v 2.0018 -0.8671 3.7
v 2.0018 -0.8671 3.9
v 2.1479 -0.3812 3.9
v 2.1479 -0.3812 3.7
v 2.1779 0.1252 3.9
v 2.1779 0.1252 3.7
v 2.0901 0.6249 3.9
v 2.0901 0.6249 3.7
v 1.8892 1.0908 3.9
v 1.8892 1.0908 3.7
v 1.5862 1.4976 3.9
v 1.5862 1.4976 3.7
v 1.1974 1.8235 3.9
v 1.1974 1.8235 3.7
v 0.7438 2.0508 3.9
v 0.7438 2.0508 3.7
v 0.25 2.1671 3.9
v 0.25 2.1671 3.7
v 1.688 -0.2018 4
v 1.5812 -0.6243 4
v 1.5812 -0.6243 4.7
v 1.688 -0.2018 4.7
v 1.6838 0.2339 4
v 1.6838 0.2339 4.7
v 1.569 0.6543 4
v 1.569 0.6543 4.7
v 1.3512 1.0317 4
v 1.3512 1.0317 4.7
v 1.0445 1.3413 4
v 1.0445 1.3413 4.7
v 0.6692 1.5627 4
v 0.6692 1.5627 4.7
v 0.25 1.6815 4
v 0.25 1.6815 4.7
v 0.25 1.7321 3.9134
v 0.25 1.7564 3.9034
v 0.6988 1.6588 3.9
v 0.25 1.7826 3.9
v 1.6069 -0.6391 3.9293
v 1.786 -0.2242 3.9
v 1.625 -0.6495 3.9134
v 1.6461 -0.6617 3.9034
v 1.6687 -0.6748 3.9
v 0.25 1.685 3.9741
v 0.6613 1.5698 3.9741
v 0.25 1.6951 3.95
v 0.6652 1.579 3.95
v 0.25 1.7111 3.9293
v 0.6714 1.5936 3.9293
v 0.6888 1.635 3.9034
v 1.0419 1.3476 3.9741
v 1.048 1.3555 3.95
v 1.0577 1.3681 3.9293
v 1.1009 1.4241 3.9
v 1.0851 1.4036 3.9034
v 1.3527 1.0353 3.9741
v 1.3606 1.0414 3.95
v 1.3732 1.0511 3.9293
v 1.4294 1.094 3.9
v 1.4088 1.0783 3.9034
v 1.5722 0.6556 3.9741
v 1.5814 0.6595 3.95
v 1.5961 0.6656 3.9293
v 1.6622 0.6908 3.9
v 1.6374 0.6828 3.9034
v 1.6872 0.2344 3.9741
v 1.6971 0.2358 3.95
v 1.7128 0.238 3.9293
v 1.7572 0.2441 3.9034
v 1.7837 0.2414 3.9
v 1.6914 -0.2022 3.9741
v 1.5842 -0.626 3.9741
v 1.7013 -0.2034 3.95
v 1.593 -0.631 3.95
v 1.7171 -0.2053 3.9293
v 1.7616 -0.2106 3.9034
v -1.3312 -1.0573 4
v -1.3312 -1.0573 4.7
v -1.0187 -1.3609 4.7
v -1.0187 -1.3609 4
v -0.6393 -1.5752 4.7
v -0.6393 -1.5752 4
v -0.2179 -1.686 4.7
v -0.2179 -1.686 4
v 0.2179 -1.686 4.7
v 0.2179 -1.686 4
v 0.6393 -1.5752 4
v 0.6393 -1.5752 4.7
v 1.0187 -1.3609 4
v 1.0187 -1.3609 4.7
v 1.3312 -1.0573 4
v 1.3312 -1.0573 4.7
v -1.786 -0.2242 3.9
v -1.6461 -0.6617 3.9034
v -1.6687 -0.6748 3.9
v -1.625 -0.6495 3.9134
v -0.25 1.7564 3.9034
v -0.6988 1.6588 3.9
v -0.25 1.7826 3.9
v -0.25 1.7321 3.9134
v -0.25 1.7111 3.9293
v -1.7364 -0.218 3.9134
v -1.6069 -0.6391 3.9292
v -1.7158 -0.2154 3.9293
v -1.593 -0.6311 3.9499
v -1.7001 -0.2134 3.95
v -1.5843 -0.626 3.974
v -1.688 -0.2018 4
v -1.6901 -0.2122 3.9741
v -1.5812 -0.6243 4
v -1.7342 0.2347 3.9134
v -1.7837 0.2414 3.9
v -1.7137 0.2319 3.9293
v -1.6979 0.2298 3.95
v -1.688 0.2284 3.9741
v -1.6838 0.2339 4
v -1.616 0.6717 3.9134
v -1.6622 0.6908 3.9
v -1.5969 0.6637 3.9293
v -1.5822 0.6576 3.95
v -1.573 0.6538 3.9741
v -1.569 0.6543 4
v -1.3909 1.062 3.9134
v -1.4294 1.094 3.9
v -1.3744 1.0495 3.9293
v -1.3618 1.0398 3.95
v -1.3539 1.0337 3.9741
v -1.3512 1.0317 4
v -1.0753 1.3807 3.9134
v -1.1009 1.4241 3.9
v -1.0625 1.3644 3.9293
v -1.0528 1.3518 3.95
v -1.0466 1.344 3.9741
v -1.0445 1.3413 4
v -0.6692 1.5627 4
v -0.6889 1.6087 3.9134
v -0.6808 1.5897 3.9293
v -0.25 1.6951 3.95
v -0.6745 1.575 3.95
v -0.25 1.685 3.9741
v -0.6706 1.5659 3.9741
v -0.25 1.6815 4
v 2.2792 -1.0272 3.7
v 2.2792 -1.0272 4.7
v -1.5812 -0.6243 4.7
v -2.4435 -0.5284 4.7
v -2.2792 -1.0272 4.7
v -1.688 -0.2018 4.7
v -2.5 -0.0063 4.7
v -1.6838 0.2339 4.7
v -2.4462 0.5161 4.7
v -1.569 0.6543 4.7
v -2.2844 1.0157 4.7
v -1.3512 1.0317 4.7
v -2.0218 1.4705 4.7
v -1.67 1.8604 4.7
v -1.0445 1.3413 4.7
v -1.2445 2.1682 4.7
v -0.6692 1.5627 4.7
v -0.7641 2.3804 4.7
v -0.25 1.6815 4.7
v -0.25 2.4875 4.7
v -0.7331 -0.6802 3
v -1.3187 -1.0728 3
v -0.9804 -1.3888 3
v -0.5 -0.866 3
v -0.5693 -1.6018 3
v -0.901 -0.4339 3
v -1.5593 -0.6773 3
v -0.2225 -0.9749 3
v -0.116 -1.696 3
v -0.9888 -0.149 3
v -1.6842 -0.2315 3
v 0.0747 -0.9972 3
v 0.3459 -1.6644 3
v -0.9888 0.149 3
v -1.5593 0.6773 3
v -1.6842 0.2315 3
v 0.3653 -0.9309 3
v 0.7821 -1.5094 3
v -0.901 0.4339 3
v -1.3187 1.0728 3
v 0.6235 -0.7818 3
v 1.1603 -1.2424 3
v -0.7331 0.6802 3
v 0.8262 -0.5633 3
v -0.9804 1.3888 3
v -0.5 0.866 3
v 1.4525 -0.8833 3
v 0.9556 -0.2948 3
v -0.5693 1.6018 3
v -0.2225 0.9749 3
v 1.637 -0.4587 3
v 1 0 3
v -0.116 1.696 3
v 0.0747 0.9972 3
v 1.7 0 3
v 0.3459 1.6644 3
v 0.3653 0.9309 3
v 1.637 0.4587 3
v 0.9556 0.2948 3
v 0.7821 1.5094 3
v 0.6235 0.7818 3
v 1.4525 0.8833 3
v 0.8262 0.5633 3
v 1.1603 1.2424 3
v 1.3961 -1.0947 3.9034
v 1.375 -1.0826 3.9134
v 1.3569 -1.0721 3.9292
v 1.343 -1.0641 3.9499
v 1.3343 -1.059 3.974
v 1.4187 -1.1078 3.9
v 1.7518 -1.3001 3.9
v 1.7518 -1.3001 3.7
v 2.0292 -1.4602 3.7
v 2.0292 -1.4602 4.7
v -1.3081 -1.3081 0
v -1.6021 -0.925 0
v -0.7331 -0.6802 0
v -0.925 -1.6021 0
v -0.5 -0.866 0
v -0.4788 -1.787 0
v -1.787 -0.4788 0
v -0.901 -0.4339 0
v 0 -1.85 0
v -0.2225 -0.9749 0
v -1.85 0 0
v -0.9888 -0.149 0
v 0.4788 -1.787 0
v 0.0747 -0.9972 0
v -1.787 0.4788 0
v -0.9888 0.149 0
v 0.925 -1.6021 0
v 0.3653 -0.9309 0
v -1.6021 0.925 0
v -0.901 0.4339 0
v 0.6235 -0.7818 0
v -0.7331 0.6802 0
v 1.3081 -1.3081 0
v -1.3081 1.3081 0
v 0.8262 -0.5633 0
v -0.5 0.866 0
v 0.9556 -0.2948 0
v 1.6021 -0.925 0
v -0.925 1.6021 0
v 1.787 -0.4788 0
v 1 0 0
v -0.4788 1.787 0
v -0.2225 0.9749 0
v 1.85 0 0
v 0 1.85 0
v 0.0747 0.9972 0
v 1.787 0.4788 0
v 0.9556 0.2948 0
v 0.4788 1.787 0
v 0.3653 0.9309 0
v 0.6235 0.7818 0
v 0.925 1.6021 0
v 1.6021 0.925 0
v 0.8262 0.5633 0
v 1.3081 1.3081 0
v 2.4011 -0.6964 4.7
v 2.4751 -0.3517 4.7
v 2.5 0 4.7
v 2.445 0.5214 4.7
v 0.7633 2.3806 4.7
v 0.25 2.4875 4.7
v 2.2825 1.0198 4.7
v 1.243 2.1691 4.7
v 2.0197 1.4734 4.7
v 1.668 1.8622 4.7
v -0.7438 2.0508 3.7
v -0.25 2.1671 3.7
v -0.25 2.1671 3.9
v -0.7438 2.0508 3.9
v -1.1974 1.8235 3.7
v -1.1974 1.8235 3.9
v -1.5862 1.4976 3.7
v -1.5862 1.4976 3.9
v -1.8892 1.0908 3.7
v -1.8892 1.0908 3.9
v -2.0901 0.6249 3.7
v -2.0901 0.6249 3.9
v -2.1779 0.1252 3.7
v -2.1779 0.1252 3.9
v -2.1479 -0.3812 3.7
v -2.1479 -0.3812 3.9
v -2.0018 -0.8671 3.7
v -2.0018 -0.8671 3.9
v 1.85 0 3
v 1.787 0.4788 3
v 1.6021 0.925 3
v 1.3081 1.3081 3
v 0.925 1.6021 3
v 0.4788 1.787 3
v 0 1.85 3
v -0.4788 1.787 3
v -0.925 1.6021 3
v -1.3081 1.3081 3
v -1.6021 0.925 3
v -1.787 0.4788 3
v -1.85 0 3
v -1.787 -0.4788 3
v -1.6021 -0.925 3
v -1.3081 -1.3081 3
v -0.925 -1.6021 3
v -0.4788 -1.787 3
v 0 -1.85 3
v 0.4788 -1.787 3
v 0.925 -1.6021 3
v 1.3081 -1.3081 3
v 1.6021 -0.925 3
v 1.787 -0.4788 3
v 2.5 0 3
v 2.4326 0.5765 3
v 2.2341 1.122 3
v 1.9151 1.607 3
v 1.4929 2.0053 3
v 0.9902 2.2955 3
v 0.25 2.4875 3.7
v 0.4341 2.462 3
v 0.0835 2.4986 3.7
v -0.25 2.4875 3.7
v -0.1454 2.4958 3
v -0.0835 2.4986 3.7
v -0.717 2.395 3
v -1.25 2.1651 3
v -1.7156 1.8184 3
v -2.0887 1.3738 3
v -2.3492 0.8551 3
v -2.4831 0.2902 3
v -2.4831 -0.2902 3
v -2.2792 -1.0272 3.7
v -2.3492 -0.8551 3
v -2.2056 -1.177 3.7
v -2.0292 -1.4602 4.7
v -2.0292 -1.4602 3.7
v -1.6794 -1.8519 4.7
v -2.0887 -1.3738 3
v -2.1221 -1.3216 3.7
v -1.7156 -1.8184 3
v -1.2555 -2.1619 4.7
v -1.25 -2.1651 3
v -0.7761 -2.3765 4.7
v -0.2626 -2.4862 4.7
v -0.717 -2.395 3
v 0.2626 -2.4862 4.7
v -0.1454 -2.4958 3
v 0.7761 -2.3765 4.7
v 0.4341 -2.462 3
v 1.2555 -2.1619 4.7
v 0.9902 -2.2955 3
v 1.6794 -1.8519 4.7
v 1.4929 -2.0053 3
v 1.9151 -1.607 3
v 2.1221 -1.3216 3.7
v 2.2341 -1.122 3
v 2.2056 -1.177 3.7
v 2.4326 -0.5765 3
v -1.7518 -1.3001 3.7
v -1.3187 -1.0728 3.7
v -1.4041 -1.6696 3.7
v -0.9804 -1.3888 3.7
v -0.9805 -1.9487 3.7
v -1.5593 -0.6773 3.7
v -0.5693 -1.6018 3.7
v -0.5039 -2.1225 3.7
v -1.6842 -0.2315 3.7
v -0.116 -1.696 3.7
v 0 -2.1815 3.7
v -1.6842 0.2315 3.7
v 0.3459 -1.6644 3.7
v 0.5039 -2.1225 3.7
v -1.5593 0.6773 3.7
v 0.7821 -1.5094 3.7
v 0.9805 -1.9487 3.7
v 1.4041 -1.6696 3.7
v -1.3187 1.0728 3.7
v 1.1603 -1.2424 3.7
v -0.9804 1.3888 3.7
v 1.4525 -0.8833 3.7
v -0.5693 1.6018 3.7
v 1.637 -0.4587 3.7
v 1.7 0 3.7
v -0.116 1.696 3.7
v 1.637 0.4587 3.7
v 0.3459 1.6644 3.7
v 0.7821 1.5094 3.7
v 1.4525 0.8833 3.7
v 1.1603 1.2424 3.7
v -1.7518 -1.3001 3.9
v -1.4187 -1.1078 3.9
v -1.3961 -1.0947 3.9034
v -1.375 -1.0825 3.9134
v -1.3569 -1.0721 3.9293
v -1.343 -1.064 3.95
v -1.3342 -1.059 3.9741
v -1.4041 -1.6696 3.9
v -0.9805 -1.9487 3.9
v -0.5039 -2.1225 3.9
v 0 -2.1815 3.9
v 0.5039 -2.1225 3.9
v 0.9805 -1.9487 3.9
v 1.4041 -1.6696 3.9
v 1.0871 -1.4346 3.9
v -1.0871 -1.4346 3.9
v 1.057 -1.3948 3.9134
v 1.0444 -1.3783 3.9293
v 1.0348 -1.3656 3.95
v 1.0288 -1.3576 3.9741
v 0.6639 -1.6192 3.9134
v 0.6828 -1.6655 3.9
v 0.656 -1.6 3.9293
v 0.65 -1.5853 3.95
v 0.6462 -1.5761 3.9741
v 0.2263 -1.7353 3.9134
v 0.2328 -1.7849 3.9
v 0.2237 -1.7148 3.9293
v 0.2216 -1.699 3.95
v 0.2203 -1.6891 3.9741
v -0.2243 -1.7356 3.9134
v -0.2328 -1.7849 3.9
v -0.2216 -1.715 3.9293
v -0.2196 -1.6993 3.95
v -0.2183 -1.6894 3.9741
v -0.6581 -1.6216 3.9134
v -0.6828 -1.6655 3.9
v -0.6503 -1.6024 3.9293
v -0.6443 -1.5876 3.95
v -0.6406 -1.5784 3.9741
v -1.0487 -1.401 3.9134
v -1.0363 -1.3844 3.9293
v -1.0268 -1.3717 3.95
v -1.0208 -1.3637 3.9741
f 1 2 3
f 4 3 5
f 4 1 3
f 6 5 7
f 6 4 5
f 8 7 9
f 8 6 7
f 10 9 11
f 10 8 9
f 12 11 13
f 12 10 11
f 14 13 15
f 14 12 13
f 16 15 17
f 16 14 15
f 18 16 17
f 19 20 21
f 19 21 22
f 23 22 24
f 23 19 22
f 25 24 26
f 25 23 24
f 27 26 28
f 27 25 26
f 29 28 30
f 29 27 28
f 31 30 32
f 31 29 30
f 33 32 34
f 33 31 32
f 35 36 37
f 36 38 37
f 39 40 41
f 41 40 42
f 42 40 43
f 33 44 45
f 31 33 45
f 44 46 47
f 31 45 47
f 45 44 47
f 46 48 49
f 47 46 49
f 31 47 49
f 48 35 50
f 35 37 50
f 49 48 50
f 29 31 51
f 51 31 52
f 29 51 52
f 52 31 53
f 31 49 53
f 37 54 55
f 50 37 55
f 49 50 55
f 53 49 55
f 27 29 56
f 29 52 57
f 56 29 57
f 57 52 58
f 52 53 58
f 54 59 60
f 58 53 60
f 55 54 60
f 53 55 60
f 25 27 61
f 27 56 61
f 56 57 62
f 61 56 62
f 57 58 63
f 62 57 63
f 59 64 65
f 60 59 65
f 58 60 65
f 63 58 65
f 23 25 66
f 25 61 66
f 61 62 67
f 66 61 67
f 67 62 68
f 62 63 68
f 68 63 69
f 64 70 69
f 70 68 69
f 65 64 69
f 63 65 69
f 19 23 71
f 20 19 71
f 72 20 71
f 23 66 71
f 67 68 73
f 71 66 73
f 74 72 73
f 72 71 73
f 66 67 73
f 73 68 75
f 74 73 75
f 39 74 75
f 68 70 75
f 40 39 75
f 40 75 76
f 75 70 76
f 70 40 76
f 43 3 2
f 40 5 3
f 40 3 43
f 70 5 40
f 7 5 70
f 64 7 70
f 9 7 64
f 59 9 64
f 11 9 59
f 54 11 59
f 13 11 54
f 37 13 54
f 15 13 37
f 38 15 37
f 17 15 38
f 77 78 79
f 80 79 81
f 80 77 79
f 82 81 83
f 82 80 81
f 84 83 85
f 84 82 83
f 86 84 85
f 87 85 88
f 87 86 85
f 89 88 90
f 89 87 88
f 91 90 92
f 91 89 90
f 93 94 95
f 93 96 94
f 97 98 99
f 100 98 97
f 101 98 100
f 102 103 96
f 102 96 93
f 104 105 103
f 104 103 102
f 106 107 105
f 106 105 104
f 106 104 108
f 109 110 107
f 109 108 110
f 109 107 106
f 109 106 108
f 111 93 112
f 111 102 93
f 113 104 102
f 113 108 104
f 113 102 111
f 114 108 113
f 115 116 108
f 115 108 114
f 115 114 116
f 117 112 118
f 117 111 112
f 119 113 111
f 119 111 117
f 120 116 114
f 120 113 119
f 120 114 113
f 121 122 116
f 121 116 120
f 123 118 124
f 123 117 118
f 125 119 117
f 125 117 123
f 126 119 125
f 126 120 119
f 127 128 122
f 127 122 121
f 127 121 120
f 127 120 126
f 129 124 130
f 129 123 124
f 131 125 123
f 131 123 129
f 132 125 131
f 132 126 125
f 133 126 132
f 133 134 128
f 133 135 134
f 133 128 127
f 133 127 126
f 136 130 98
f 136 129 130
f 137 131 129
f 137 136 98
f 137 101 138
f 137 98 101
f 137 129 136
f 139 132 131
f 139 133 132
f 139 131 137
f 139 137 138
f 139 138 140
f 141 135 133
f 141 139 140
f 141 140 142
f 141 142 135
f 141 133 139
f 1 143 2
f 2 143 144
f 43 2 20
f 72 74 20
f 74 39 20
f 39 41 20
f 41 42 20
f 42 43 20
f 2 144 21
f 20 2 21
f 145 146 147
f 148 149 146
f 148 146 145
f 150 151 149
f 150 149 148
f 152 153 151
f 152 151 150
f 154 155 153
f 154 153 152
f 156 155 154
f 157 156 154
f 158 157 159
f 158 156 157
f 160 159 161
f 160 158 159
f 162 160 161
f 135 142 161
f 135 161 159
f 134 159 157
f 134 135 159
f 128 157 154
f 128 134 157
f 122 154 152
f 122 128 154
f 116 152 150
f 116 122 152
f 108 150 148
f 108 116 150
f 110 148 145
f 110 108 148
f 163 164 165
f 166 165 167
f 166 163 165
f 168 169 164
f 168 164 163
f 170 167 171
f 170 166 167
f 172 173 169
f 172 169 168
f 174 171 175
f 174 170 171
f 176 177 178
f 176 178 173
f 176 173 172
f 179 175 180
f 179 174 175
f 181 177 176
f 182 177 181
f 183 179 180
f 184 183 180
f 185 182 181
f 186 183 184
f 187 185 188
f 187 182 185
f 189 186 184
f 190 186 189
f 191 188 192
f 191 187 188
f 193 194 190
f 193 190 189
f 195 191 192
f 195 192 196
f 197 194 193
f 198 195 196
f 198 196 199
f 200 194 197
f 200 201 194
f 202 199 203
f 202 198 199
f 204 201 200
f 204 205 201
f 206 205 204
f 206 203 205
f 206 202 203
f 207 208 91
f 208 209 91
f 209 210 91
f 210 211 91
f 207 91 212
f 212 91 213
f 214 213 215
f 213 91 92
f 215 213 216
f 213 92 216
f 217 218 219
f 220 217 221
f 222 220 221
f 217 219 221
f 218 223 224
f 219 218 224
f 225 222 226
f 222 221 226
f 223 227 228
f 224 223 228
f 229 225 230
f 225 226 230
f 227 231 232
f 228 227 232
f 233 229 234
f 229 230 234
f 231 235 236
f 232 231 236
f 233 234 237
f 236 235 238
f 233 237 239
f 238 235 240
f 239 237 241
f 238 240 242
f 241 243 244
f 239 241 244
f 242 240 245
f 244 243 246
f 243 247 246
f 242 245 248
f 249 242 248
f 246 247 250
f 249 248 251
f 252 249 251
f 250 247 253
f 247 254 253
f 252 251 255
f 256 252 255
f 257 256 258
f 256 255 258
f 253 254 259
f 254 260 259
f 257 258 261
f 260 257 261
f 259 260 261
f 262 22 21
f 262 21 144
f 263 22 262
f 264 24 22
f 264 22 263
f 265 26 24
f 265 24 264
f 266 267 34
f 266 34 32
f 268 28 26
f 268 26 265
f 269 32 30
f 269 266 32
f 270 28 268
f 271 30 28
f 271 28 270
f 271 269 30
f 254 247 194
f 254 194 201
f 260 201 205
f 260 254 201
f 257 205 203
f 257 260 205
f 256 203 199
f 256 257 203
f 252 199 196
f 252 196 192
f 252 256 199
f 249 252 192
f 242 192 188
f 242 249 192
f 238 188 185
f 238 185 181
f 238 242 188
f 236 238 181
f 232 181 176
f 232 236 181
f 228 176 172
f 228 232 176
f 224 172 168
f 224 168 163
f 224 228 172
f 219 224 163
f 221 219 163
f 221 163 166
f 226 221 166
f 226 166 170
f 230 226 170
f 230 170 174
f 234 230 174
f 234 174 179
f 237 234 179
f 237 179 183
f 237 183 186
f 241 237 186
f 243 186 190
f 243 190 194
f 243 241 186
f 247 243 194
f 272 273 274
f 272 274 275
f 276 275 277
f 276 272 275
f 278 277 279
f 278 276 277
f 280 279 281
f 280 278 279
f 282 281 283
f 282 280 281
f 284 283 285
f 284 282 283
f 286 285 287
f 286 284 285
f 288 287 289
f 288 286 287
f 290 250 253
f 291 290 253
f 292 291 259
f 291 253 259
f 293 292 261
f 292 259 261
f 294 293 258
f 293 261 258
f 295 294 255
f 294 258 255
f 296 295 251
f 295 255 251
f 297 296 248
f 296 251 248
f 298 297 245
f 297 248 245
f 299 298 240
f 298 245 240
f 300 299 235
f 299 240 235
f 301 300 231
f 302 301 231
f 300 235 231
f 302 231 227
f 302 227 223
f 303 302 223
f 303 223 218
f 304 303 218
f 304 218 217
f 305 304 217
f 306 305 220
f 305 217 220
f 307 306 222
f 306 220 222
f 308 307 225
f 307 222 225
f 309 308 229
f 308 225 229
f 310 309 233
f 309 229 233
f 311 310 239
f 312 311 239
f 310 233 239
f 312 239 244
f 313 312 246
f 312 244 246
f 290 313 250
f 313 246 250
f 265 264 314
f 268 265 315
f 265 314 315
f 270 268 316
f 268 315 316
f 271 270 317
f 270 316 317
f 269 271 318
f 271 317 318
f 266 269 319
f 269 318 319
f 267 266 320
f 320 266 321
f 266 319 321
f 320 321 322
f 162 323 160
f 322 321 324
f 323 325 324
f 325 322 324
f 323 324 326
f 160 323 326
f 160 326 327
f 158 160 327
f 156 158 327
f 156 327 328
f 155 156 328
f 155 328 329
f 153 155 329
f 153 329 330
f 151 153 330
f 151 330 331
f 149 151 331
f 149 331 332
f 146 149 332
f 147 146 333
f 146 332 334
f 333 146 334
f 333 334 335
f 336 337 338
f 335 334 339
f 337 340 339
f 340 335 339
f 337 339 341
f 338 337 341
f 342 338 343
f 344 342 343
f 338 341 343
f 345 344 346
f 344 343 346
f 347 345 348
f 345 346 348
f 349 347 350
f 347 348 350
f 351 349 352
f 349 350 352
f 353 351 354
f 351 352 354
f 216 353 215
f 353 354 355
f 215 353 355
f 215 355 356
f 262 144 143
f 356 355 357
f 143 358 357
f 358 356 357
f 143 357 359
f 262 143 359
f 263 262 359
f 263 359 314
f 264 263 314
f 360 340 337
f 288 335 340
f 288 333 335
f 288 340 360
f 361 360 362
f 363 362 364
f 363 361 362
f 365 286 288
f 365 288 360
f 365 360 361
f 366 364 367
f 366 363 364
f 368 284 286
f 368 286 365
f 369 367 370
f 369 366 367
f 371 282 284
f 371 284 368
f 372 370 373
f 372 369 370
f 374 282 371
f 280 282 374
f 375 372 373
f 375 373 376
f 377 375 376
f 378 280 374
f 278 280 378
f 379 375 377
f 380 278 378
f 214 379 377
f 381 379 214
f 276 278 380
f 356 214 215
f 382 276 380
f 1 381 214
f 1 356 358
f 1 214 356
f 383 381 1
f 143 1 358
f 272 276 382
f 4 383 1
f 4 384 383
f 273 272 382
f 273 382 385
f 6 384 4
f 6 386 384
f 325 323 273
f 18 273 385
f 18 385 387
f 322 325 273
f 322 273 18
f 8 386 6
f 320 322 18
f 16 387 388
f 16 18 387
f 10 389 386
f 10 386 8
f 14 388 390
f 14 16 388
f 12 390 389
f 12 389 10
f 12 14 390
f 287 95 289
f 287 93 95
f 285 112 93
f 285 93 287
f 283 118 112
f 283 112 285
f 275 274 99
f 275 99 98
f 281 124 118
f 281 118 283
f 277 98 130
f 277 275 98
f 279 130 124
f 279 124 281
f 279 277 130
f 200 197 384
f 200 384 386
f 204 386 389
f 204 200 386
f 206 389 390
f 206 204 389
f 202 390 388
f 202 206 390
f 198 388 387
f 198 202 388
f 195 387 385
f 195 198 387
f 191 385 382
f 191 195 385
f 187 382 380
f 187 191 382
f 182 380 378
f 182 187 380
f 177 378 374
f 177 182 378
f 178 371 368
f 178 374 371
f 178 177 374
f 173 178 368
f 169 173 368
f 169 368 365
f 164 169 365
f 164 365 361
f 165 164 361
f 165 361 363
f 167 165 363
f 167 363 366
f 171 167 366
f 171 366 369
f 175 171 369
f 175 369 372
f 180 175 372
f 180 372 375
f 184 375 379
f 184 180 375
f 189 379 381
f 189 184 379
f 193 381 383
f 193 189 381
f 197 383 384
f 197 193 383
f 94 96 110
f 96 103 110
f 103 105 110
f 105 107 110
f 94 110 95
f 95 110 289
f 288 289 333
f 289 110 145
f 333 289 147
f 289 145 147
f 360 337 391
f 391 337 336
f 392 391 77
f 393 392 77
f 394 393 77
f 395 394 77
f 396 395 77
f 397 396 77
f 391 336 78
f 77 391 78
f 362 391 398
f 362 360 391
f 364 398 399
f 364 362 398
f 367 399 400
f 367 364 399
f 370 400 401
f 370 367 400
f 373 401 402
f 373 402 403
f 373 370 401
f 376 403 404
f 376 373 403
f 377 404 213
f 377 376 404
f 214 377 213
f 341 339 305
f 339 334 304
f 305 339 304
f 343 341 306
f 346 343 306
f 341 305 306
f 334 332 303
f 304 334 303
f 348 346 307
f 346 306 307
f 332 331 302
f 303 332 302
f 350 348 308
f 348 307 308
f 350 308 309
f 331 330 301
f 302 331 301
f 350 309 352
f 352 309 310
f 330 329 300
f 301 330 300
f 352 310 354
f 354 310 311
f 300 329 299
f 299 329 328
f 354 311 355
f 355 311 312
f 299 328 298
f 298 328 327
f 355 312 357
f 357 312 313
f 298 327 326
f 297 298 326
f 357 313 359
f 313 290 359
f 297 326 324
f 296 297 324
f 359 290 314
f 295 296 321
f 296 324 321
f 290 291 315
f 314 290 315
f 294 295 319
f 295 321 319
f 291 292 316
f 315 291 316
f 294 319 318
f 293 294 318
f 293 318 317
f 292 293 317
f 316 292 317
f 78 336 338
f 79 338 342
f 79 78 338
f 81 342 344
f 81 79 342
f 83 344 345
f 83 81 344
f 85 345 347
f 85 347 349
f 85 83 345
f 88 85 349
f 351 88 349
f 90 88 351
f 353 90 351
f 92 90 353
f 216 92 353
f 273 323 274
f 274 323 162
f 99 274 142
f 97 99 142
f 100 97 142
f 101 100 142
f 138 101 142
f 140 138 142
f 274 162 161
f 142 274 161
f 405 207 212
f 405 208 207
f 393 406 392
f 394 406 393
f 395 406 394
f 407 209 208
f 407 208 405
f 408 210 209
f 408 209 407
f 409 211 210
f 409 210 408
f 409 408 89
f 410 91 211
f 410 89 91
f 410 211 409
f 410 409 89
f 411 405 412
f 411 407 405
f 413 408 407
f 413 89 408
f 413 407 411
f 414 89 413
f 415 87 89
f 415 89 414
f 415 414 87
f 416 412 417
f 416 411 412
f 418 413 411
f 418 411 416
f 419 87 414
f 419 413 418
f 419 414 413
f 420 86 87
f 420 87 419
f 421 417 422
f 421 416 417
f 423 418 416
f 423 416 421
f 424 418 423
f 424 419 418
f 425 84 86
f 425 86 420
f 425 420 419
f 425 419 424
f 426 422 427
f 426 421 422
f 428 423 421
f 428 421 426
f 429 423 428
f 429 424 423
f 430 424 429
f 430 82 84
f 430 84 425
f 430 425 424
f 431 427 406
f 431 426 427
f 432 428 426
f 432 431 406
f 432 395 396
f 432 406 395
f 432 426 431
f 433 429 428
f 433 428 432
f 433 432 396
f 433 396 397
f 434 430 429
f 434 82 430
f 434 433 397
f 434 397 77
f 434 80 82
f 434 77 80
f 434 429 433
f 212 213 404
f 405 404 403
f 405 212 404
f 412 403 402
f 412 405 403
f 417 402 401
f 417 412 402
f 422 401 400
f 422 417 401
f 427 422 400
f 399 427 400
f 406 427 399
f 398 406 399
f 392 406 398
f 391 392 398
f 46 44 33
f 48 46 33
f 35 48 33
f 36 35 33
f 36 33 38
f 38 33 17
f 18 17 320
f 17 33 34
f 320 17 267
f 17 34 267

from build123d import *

# Parameters (mm, degrees)
SKETCH_1_R          = 1.85
SKETCH_1_R_2        = 1
EXTRUDE_3_DEPTH     = 3
SKETCH_4_R          = 2.5
SKETCH_4_R_2        = 1.7
EXTRUDE_4_DEPTH     = 1.7
CUT_EXTRUDE_3_DEPTH = 1
SKETCH_7_W          = 0.2
SKETCH_7_H          = 0.5
FILLET_1_R          = 0.1


with BuildPart() as part:
    # Эскиз1 → Бобышка-Вытянуть3 (new body)
    with BuildSketch(Plane.XY):
        Circle(SKETCH_1_R)
        Circle(SKETCH_1_R_2, mode=Mode.SUBTRACT)
    extrude(amount=EXTRUDE_3_DEPTH)

    # Эскиз4 → Бобышка-Вытянуть4 (add)
    with BuildSketch(Plane.XY.offset(3)):
        Circle(SKETCH_4_R)
        Circle(SKETCH_4_R_2, mode=Mode.SUBTRACT)
    extrude(amount=EXTRUDE_4_DEPTH)

    # Эскиз5 → Вырез-Вытянуть3 (cut)
    with BuildSketch(Plane.XY.offset(4.7)):
        with BuildLine():
            Line((0.25, 1.580348063), (0.25, 2.5))
            ThreePointArc((0.25, 2.5), (0, 2.512468905), (-0.25, 2.5))
            Line((-0.25, 2.5), (-0.25, 1.580348063))
            ThreePointArc((-0.25, 1.580348063), (0, 1.6), (0.25, 1.580348063))
        make_face()
        with BuildLine():
            Line((1.243621569, -1.006680382), (2.040063509, -1.466506351))
            ThreePointArc((2.040063509, -1.466506351), (2.175861898, -1.256234453), (2.290063509, -1.033493649))
            Line((2.290063509, -1.033493649), (1.493621569, -0.573667681))
            ThreePointArc((1.493621569, -0.573667681), (1.385640646, -0.8), (1.243621569, -1.006680382))
        make_face()
        with BuildLine():
            Line((-1.493621569, -0.573667681), (-2.290063509, -1.033493649))
            ThreePointArc((-2.290063509, -1.033493649), (-2.175861898, -1.256234453), (-2.040063509, -1.466506351))
            Line((-2.040063509, -1.466506351), (-1.243621569, -1.006680382))
            ThreePointArc((-1.243621569, -1.006680382), (-1.385640646, -0.8), (-1.493621569, -0.573667681))
        make_face()
    extrude(amount=-CUT_EXTRUDE_3_DEPTH, mode=Mode.SUBTRACT)

    # Эскиз7 → Вырез-Повернуть1 (revolve, cut)
    with BuildSketch(Plane(origin=(0, 0, 0), x_dir=(0, 0, -1), z_dir=(1, 0, 0)), mode=Mode.PRIVATE) as cut_revolve_1_sk:
        with Locations((-3.8, 1.931517172)):
            Rectangle(SKETCH_7_W, SKETCH_7_H)
    revolve(cut_revolve_1_sk.sketch.rotate(Axis((0, 0, 0), (0, 0, 1)), 270), axis=Axis((0, 0, 0), (0, 0, 1)), mode=Mode.SUBTRACT)

    # Скругление1
    fillet_1_edges = [part.edges().sort_by_distance(p)[0] for p in [
        (0, -1.7, 3.9),
        (1.472243186, 0.85, 3.9),
        (-1.472243186, 0.85, 3.9),
    ]]
    fillet(fillet_1_edges, radius=FILLET_1_R)


solid = part.part
